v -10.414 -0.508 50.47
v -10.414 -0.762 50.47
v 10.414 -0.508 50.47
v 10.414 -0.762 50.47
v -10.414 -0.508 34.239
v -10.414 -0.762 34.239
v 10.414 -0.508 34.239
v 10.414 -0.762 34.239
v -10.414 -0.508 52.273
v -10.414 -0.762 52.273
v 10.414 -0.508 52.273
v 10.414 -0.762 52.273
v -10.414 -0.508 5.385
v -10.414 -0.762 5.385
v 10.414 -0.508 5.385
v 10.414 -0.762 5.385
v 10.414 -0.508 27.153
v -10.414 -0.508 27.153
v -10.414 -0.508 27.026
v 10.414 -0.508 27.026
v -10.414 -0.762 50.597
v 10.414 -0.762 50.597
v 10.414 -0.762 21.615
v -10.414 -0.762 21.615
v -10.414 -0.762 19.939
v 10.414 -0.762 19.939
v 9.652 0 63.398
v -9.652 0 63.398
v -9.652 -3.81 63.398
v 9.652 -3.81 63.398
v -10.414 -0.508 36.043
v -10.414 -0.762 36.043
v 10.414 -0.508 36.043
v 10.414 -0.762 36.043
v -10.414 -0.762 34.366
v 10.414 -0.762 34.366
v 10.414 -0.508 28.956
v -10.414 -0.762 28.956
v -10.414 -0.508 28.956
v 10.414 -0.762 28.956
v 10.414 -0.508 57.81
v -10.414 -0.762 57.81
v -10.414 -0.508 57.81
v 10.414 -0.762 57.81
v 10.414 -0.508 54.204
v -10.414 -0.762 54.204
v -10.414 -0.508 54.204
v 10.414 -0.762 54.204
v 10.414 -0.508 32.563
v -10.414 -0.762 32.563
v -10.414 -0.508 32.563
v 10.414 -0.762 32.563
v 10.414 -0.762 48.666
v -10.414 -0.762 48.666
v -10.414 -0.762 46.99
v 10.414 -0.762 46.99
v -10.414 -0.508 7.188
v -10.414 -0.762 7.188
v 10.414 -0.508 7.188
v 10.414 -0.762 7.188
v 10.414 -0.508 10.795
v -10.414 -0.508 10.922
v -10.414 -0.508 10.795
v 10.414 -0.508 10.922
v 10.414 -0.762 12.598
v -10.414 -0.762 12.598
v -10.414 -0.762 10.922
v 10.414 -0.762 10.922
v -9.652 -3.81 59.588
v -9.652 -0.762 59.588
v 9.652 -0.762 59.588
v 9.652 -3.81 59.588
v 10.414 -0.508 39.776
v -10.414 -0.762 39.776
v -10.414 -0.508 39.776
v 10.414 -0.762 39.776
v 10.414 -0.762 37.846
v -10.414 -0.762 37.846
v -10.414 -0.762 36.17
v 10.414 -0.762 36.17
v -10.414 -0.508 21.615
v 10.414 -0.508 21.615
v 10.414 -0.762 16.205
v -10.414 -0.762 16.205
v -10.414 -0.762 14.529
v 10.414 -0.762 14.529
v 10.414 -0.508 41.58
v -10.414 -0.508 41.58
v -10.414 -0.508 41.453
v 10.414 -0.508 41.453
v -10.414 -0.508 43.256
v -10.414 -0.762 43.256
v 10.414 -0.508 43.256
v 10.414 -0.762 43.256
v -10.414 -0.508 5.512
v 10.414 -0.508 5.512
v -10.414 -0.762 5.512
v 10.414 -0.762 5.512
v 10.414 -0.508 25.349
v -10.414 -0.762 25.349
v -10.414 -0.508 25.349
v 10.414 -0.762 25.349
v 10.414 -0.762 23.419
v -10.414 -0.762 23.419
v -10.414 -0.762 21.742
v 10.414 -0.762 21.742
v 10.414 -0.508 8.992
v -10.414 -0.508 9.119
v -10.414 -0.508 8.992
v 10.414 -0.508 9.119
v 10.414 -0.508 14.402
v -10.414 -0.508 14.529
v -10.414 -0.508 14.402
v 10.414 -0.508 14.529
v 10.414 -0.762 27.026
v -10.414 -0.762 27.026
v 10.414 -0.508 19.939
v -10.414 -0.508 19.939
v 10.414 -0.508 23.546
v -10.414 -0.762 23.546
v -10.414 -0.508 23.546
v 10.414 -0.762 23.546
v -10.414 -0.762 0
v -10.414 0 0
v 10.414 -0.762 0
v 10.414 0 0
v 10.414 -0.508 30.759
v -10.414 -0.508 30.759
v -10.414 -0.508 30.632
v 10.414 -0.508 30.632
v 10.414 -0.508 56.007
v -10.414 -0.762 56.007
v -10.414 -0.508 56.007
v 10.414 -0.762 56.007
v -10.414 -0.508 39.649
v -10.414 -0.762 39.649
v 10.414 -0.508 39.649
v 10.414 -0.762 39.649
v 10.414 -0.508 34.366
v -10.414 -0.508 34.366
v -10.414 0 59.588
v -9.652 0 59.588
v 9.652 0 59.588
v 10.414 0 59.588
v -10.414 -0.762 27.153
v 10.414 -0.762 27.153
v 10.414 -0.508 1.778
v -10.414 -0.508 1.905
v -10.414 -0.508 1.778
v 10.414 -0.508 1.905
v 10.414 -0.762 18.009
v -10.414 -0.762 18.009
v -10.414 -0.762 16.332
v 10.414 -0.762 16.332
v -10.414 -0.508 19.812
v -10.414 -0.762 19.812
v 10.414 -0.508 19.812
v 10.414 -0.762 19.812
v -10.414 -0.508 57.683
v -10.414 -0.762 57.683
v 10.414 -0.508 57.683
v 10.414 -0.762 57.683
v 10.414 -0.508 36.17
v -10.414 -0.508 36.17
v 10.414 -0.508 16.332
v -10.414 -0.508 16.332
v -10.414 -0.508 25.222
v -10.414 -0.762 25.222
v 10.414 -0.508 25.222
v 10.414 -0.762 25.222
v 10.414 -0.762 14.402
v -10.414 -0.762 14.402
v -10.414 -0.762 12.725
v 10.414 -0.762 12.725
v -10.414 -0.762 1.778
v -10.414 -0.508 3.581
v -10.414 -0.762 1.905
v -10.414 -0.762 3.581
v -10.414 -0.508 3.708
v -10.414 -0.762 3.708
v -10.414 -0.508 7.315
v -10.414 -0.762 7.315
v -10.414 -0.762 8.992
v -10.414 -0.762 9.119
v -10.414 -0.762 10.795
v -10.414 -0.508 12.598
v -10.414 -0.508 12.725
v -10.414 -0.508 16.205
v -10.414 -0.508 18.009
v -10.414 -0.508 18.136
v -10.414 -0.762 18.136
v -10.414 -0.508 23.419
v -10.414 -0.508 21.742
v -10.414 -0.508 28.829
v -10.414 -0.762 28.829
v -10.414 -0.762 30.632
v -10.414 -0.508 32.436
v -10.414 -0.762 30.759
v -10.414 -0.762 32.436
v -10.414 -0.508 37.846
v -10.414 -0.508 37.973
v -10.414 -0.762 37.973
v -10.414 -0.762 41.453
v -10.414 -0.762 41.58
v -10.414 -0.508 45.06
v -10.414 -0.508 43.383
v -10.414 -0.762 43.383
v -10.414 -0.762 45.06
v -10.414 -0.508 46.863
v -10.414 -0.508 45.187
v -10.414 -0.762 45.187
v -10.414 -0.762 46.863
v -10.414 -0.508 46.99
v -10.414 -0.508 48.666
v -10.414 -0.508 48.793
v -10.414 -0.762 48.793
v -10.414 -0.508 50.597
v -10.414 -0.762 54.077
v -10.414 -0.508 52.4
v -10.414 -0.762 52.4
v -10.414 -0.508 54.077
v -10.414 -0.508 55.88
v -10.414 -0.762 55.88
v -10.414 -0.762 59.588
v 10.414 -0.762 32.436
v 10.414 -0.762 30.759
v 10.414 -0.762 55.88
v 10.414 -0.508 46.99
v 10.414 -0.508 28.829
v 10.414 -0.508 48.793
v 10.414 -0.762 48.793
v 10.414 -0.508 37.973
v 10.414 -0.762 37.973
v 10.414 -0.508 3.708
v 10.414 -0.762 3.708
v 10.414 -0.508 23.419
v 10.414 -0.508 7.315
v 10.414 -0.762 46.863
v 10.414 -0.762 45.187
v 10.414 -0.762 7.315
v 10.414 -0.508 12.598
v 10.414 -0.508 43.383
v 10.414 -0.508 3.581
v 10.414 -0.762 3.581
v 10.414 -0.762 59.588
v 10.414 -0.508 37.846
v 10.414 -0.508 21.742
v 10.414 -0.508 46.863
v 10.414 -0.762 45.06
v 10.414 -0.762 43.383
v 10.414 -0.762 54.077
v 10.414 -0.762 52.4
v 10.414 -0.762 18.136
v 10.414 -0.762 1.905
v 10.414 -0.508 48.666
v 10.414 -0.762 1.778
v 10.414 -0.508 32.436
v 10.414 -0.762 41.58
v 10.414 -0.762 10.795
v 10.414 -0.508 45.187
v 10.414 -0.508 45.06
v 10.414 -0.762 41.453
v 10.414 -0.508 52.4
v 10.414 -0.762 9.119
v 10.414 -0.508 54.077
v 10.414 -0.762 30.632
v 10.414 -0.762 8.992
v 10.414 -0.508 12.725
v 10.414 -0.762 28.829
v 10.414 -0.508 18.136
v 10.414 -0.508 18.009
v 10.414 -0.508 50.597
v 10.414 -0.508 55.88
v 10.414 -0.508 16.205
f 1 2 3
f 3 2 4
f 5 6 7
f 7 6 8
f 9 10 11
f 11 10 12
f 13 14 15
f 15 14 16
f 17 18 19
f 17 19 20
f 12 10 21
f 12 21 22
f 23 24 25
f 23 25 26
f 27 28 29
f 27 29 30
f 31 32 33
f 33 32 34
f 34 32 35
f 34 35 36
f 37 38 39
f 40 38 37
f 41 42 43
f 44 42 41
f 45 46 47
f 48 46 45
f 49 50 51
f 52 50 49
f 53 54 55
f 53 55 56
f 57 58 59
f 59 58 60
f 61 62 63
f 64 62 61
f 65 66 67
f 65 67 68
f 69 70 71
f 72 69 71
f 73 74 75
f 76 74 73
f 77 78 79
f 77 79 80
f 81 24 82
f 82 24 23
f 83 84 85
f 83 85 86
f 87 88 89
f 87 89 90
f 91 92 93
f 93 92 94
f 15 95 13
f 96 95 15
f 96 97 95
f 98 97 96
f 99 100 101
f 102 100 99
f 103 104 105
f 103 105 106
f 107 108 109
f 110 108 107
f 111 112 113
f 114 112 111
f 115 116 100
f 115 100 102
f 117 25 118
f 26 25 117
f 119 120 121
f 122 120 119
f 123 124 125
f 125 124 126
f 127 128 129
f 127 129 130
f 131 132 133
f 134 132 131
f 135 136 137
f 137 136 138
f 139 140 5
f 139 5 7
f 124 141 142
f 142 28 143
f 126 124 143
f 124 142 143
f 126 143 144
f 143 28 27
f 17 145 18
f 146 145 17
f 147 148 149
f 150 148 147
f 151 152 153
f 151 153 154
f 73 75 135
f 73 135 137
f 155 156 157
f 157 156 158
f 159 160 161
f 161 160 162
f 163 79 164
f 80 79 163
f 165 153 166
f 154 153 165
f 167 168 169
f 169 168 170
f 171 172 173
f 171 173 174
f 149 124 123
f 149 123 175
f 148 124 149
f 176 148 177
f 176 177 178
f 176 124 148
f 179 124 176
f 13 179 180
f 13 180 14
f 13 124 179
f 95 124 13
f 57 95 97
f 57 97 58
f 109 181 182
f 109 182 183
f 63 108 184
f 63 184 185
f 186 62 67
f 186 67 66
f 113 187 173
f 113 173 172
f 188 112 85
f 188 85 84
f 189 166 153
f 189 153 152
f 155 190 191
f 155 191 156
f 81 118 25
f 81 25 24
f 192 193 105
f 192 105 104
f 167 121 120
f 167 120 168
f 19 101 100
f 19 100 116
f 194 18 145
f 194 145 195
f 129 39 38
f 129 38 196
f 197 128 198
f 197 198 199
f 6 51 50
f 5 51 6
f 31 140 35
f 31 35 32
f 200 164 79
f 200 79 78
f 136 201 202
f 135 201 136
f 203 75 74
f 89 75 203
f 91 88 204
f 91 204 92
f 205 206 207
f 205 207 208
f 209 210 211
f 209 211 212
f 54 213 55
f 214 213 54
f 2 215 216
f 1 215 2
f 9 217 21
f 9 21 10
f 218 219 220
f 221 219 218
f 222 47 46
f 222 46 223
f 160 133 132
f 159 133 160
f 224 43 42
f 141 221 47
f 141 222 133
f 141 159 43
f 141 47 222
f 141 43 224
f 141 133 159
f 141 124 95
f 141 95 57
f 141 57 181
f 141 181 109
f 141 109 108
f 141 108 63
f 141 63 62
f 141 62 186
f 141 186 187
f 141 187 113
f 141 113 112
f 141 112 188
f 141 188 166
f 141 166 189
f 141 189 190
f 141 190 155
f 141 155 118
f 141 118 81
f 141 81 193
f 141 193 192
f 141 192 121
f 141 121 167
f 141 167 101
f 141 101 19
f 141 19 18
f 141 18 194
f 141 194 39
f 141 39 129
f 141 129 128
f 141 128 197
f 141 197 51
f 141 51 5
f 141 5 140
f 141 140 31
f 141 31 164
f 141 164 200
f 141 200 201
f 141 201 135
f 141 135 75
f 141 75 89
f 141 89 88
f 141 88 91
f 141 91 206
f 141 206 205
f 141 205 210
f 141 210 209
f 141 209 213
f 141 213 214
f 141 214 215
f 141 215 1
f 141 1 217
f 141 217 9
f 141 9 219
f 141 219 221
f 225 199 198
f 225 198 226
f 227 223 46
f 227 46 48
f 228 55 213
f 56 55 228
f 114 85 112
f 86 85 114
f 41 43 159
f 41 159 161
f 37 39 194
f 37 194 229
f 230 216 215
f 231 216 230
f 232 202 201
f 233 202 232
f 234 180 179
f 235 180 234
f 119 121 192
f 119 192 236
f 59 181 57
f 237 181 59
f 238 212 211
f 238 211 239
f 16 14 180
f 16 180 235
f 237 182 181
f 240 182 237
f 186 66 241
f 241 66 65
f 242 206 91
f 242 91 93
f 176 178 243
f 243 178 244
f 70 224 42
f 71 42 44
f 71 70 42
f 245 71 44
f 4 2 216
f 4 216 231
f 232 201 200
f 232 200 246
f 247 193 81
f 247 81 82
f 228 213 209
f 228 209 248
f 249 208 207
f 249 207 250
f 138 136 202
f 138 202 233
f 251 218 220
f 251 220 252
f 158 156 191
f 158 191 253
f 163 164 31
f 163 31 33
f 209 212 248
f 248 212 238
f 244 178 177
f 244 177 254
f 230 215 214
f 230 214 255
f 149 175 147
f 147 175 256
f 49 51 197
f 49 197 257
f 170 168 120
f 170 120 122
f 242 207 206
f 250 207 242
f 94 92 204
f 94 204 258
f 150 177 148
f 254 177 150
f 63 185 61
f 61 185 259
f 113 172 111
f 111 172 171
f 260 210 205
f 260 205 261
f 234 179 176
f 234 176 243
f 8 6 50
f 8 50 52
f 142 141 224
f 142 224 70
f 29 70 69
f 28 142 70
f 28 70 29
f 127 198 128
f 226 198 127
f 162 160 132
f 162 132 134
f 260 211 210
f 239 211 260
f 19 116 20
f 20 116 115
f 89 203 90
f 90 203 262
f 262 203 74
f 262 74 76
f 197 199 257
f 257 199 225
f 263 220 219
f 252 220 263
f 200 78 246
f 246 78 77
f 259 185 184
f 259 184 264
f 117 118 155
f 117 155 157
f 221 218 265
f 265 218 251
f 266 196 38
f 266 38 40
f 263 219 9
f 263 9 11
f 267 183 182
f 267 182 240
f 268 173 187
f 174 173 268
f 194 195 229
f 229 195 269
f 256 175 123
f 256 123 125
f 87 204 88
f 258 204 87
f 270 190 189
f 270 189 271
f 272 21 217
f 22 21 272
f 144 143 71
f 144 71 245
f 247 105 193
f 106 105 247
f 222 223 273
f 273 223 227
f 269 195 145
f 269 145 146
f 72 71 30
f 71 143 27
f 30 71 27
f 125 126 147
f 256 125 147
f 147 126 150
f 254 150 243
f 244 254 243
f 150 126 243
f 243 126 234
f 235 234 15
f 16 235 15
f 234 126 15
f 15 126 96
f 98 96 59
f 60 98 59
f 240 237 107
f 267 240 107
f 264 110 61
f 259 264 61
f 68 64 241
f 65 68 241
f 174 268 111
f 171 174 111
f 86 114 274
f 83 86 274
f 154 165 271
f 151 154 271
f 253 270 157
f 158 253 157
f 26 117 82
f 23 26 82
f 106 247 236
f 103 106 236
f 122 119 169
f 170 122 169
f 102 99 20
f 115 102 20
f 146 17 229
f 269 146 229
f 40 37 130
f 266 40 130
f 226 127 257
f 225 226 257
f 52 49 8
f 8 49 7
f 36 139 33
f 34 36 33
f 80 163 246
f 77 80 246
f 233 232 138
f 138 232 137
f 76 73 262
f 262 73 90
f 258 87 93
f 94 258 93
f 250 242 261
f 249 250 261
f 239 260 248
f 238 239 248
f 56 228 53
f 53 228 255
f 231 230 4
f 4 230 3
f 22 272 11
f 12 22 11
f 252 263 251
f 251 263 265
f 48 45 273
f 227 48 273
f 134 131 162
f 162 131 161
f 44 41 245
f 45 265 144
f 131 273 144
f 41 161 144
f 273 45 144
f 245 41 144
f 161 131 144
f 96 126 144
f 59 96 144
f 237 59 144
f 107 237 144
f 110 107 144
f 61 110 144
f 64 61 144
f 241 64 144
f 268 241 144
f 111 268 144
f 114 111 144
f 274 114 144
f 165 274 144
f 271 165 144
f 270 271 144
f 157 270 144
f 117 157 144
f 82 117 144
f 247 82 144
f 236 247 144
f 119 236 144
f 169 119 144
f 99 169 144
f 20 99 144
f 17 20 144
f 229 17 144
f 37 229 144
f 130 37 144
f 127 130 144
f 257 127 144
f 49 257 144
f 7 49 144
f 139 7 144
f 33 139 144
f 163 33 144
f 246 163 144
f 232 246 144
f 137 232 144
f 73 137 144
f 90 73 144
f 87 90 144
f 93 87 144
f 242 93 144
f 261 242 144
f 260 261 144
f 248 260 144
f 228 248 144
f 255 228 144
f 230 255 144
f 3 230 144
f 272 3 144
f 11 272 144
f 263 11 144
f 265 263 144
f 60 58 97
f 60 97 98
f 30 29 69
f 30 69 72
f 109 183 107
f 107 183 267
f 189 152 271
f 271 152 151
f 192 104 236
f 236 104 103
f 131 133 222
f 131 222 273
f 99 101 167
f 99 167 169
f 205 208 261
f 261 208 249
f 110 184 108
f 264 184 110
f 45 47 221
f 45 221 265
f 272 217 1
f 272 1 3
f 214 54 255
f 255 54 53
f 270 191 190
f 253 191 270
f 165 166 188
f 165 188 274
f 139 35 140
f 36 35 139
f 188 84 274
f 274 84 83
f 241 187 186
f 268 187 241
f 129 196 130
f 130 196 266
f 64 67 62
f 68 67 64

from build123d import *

# Parameters (mm, degrees)
F0_W     = 19.304
F0_H     = 59.5884
F1_DEPTH = 0.762
F2_W     = 0.762
F2_H     = 59.5884
F3_DEPTH = 0.762
F4_W     = 19.304
F4_H     = 3.81
F5_DEPTH = 3.81
F6_W     = 20.828
F6_H     = 0.127
F7_DEPTH = 0.254


with BuildPart() as f1:
    # F0 (on Front) → F1 (new body)
    with BuildSketch(Plane.XZ):
        with Locations((0, 29.7942)):
            Rectangle(F0_W, F0_H)
    extrude(amount=F1_DEPTH)

    # F2 (on Front) → F3 (join)
    with BuildSketch(Plane.XZ):
        with Locations((-10.033, 29.7942)):
            Rectangle(F2_W, F2_H)
        with Locations((10.033, 29.7942)):
            Rectangle(F2_W, F2_H)
    extrude(amount=F3_DEPTH)

    # F4 (on Front) → F5 (join)
    with BuildSketch(Plane.XZ):
        with Locations((0, 61.4934)):
            Rectangle(F4_W, F4_H)
    extrude(amount=F5_DEPTH)

    # F6 (on face) → F7 (cut)
    with BuildSketch(Plane.XZ.offset(0.762)):
        with Locations((0, 1.8415)):
            Rectangle(F6_W, F6_H)
        with Locations((0, 3.6449)):
            Rectangle(F6_W, F6_H)
        with Locations((0, 5.4483)):
            Rectangle(F6_W, F6_H)
        with Locations((0, 7.2517)):
            Rectangle(F6_W, F6_H)
        with Locations((0, 9.0551)):
            Rectangle(F6_W, F6_H)
        with Locations((0, 10.8585)):
            Rectangle(F6_W, F6_H)
        with Locations((0, 12.6619)):
            Rectangle(F6_W, F6_H)
        with Locations((0, 14.4653)):
            Rectangle(F6_W, F6_H)
        with Locations((0, 16.2687)):
            Rectangle(F6_W, F6_H)
        with Locations((0, 18.0721)):
            Rectangle(F6_W, F6_H)
        with Locations((0, 19.8755)):
            Rectangle(F6_W, F6_H)
        with Locations((0, 21.6789)):
            Rectangle(F6_W, F6_H)
        with Locations((0, 23.4823)):
            Rectangle(F6_W, F6_H)
        with Locations((0, 25.2857)):
            Rectangle(F6_W, F6_H)
        with Locations((0, 27.0891)):
            Rectangle(F6_W, F6_H)
        with Locations((0, 28.8925)):
            Rectangle(F6_W, F6_H)
        with Locations((0, 30.6959)):
            Rectangle(F6_W, F6_H)
        with Locations((0, 32.4993)):
            Rectangle(F6_W, F6_H)
        with Locations((0, 34.3027)):
            Rectangle(F6_W, F6_H)
        with Locations((0, 36.1061)):
            Rectangle(F6_W, F6_H)
        with Locations((0, 37.9095)):
            Rectangle(F6_W, F6_H)
        with Locations((0, 39.7129)):
            Rectangle(F6_W, F6_H)
        with Locations((0, 41.5163)):
            Rectangle(F6_W, F6_H)
        with Locations((0, 43.3197)):
            Rectangle(F6_W, F6_H)
        with Locations((0, 45.1231)):
            Rectangle(F6_W, F6_H)
        with Locations((0, 46.9265)):
            Rectangle(F6_W, F6_H)
        with Locations((0, 48.7299)):
            Rectangle(F6_W, F6_H)
        with Locations((0, 50.5333)):
            Rectangle(F6_W, F6_H)
        with Locations((0, 52.3367)):
            Rectangle(F6_W, F6_H)
        with Locations((0, 54.1401)):
            Rectangle(F6_W, F6_H)
        with Locations((0, 55.9435)):
            Rectangle(F6_W, F6_H)
        with Locations((0, 57.7469)):
            Rectangle(F6_W, F6_H)
    extrude(amount=-F7_DEPTH, mode=Mode.SUBTRACT)


solid = f1.part
